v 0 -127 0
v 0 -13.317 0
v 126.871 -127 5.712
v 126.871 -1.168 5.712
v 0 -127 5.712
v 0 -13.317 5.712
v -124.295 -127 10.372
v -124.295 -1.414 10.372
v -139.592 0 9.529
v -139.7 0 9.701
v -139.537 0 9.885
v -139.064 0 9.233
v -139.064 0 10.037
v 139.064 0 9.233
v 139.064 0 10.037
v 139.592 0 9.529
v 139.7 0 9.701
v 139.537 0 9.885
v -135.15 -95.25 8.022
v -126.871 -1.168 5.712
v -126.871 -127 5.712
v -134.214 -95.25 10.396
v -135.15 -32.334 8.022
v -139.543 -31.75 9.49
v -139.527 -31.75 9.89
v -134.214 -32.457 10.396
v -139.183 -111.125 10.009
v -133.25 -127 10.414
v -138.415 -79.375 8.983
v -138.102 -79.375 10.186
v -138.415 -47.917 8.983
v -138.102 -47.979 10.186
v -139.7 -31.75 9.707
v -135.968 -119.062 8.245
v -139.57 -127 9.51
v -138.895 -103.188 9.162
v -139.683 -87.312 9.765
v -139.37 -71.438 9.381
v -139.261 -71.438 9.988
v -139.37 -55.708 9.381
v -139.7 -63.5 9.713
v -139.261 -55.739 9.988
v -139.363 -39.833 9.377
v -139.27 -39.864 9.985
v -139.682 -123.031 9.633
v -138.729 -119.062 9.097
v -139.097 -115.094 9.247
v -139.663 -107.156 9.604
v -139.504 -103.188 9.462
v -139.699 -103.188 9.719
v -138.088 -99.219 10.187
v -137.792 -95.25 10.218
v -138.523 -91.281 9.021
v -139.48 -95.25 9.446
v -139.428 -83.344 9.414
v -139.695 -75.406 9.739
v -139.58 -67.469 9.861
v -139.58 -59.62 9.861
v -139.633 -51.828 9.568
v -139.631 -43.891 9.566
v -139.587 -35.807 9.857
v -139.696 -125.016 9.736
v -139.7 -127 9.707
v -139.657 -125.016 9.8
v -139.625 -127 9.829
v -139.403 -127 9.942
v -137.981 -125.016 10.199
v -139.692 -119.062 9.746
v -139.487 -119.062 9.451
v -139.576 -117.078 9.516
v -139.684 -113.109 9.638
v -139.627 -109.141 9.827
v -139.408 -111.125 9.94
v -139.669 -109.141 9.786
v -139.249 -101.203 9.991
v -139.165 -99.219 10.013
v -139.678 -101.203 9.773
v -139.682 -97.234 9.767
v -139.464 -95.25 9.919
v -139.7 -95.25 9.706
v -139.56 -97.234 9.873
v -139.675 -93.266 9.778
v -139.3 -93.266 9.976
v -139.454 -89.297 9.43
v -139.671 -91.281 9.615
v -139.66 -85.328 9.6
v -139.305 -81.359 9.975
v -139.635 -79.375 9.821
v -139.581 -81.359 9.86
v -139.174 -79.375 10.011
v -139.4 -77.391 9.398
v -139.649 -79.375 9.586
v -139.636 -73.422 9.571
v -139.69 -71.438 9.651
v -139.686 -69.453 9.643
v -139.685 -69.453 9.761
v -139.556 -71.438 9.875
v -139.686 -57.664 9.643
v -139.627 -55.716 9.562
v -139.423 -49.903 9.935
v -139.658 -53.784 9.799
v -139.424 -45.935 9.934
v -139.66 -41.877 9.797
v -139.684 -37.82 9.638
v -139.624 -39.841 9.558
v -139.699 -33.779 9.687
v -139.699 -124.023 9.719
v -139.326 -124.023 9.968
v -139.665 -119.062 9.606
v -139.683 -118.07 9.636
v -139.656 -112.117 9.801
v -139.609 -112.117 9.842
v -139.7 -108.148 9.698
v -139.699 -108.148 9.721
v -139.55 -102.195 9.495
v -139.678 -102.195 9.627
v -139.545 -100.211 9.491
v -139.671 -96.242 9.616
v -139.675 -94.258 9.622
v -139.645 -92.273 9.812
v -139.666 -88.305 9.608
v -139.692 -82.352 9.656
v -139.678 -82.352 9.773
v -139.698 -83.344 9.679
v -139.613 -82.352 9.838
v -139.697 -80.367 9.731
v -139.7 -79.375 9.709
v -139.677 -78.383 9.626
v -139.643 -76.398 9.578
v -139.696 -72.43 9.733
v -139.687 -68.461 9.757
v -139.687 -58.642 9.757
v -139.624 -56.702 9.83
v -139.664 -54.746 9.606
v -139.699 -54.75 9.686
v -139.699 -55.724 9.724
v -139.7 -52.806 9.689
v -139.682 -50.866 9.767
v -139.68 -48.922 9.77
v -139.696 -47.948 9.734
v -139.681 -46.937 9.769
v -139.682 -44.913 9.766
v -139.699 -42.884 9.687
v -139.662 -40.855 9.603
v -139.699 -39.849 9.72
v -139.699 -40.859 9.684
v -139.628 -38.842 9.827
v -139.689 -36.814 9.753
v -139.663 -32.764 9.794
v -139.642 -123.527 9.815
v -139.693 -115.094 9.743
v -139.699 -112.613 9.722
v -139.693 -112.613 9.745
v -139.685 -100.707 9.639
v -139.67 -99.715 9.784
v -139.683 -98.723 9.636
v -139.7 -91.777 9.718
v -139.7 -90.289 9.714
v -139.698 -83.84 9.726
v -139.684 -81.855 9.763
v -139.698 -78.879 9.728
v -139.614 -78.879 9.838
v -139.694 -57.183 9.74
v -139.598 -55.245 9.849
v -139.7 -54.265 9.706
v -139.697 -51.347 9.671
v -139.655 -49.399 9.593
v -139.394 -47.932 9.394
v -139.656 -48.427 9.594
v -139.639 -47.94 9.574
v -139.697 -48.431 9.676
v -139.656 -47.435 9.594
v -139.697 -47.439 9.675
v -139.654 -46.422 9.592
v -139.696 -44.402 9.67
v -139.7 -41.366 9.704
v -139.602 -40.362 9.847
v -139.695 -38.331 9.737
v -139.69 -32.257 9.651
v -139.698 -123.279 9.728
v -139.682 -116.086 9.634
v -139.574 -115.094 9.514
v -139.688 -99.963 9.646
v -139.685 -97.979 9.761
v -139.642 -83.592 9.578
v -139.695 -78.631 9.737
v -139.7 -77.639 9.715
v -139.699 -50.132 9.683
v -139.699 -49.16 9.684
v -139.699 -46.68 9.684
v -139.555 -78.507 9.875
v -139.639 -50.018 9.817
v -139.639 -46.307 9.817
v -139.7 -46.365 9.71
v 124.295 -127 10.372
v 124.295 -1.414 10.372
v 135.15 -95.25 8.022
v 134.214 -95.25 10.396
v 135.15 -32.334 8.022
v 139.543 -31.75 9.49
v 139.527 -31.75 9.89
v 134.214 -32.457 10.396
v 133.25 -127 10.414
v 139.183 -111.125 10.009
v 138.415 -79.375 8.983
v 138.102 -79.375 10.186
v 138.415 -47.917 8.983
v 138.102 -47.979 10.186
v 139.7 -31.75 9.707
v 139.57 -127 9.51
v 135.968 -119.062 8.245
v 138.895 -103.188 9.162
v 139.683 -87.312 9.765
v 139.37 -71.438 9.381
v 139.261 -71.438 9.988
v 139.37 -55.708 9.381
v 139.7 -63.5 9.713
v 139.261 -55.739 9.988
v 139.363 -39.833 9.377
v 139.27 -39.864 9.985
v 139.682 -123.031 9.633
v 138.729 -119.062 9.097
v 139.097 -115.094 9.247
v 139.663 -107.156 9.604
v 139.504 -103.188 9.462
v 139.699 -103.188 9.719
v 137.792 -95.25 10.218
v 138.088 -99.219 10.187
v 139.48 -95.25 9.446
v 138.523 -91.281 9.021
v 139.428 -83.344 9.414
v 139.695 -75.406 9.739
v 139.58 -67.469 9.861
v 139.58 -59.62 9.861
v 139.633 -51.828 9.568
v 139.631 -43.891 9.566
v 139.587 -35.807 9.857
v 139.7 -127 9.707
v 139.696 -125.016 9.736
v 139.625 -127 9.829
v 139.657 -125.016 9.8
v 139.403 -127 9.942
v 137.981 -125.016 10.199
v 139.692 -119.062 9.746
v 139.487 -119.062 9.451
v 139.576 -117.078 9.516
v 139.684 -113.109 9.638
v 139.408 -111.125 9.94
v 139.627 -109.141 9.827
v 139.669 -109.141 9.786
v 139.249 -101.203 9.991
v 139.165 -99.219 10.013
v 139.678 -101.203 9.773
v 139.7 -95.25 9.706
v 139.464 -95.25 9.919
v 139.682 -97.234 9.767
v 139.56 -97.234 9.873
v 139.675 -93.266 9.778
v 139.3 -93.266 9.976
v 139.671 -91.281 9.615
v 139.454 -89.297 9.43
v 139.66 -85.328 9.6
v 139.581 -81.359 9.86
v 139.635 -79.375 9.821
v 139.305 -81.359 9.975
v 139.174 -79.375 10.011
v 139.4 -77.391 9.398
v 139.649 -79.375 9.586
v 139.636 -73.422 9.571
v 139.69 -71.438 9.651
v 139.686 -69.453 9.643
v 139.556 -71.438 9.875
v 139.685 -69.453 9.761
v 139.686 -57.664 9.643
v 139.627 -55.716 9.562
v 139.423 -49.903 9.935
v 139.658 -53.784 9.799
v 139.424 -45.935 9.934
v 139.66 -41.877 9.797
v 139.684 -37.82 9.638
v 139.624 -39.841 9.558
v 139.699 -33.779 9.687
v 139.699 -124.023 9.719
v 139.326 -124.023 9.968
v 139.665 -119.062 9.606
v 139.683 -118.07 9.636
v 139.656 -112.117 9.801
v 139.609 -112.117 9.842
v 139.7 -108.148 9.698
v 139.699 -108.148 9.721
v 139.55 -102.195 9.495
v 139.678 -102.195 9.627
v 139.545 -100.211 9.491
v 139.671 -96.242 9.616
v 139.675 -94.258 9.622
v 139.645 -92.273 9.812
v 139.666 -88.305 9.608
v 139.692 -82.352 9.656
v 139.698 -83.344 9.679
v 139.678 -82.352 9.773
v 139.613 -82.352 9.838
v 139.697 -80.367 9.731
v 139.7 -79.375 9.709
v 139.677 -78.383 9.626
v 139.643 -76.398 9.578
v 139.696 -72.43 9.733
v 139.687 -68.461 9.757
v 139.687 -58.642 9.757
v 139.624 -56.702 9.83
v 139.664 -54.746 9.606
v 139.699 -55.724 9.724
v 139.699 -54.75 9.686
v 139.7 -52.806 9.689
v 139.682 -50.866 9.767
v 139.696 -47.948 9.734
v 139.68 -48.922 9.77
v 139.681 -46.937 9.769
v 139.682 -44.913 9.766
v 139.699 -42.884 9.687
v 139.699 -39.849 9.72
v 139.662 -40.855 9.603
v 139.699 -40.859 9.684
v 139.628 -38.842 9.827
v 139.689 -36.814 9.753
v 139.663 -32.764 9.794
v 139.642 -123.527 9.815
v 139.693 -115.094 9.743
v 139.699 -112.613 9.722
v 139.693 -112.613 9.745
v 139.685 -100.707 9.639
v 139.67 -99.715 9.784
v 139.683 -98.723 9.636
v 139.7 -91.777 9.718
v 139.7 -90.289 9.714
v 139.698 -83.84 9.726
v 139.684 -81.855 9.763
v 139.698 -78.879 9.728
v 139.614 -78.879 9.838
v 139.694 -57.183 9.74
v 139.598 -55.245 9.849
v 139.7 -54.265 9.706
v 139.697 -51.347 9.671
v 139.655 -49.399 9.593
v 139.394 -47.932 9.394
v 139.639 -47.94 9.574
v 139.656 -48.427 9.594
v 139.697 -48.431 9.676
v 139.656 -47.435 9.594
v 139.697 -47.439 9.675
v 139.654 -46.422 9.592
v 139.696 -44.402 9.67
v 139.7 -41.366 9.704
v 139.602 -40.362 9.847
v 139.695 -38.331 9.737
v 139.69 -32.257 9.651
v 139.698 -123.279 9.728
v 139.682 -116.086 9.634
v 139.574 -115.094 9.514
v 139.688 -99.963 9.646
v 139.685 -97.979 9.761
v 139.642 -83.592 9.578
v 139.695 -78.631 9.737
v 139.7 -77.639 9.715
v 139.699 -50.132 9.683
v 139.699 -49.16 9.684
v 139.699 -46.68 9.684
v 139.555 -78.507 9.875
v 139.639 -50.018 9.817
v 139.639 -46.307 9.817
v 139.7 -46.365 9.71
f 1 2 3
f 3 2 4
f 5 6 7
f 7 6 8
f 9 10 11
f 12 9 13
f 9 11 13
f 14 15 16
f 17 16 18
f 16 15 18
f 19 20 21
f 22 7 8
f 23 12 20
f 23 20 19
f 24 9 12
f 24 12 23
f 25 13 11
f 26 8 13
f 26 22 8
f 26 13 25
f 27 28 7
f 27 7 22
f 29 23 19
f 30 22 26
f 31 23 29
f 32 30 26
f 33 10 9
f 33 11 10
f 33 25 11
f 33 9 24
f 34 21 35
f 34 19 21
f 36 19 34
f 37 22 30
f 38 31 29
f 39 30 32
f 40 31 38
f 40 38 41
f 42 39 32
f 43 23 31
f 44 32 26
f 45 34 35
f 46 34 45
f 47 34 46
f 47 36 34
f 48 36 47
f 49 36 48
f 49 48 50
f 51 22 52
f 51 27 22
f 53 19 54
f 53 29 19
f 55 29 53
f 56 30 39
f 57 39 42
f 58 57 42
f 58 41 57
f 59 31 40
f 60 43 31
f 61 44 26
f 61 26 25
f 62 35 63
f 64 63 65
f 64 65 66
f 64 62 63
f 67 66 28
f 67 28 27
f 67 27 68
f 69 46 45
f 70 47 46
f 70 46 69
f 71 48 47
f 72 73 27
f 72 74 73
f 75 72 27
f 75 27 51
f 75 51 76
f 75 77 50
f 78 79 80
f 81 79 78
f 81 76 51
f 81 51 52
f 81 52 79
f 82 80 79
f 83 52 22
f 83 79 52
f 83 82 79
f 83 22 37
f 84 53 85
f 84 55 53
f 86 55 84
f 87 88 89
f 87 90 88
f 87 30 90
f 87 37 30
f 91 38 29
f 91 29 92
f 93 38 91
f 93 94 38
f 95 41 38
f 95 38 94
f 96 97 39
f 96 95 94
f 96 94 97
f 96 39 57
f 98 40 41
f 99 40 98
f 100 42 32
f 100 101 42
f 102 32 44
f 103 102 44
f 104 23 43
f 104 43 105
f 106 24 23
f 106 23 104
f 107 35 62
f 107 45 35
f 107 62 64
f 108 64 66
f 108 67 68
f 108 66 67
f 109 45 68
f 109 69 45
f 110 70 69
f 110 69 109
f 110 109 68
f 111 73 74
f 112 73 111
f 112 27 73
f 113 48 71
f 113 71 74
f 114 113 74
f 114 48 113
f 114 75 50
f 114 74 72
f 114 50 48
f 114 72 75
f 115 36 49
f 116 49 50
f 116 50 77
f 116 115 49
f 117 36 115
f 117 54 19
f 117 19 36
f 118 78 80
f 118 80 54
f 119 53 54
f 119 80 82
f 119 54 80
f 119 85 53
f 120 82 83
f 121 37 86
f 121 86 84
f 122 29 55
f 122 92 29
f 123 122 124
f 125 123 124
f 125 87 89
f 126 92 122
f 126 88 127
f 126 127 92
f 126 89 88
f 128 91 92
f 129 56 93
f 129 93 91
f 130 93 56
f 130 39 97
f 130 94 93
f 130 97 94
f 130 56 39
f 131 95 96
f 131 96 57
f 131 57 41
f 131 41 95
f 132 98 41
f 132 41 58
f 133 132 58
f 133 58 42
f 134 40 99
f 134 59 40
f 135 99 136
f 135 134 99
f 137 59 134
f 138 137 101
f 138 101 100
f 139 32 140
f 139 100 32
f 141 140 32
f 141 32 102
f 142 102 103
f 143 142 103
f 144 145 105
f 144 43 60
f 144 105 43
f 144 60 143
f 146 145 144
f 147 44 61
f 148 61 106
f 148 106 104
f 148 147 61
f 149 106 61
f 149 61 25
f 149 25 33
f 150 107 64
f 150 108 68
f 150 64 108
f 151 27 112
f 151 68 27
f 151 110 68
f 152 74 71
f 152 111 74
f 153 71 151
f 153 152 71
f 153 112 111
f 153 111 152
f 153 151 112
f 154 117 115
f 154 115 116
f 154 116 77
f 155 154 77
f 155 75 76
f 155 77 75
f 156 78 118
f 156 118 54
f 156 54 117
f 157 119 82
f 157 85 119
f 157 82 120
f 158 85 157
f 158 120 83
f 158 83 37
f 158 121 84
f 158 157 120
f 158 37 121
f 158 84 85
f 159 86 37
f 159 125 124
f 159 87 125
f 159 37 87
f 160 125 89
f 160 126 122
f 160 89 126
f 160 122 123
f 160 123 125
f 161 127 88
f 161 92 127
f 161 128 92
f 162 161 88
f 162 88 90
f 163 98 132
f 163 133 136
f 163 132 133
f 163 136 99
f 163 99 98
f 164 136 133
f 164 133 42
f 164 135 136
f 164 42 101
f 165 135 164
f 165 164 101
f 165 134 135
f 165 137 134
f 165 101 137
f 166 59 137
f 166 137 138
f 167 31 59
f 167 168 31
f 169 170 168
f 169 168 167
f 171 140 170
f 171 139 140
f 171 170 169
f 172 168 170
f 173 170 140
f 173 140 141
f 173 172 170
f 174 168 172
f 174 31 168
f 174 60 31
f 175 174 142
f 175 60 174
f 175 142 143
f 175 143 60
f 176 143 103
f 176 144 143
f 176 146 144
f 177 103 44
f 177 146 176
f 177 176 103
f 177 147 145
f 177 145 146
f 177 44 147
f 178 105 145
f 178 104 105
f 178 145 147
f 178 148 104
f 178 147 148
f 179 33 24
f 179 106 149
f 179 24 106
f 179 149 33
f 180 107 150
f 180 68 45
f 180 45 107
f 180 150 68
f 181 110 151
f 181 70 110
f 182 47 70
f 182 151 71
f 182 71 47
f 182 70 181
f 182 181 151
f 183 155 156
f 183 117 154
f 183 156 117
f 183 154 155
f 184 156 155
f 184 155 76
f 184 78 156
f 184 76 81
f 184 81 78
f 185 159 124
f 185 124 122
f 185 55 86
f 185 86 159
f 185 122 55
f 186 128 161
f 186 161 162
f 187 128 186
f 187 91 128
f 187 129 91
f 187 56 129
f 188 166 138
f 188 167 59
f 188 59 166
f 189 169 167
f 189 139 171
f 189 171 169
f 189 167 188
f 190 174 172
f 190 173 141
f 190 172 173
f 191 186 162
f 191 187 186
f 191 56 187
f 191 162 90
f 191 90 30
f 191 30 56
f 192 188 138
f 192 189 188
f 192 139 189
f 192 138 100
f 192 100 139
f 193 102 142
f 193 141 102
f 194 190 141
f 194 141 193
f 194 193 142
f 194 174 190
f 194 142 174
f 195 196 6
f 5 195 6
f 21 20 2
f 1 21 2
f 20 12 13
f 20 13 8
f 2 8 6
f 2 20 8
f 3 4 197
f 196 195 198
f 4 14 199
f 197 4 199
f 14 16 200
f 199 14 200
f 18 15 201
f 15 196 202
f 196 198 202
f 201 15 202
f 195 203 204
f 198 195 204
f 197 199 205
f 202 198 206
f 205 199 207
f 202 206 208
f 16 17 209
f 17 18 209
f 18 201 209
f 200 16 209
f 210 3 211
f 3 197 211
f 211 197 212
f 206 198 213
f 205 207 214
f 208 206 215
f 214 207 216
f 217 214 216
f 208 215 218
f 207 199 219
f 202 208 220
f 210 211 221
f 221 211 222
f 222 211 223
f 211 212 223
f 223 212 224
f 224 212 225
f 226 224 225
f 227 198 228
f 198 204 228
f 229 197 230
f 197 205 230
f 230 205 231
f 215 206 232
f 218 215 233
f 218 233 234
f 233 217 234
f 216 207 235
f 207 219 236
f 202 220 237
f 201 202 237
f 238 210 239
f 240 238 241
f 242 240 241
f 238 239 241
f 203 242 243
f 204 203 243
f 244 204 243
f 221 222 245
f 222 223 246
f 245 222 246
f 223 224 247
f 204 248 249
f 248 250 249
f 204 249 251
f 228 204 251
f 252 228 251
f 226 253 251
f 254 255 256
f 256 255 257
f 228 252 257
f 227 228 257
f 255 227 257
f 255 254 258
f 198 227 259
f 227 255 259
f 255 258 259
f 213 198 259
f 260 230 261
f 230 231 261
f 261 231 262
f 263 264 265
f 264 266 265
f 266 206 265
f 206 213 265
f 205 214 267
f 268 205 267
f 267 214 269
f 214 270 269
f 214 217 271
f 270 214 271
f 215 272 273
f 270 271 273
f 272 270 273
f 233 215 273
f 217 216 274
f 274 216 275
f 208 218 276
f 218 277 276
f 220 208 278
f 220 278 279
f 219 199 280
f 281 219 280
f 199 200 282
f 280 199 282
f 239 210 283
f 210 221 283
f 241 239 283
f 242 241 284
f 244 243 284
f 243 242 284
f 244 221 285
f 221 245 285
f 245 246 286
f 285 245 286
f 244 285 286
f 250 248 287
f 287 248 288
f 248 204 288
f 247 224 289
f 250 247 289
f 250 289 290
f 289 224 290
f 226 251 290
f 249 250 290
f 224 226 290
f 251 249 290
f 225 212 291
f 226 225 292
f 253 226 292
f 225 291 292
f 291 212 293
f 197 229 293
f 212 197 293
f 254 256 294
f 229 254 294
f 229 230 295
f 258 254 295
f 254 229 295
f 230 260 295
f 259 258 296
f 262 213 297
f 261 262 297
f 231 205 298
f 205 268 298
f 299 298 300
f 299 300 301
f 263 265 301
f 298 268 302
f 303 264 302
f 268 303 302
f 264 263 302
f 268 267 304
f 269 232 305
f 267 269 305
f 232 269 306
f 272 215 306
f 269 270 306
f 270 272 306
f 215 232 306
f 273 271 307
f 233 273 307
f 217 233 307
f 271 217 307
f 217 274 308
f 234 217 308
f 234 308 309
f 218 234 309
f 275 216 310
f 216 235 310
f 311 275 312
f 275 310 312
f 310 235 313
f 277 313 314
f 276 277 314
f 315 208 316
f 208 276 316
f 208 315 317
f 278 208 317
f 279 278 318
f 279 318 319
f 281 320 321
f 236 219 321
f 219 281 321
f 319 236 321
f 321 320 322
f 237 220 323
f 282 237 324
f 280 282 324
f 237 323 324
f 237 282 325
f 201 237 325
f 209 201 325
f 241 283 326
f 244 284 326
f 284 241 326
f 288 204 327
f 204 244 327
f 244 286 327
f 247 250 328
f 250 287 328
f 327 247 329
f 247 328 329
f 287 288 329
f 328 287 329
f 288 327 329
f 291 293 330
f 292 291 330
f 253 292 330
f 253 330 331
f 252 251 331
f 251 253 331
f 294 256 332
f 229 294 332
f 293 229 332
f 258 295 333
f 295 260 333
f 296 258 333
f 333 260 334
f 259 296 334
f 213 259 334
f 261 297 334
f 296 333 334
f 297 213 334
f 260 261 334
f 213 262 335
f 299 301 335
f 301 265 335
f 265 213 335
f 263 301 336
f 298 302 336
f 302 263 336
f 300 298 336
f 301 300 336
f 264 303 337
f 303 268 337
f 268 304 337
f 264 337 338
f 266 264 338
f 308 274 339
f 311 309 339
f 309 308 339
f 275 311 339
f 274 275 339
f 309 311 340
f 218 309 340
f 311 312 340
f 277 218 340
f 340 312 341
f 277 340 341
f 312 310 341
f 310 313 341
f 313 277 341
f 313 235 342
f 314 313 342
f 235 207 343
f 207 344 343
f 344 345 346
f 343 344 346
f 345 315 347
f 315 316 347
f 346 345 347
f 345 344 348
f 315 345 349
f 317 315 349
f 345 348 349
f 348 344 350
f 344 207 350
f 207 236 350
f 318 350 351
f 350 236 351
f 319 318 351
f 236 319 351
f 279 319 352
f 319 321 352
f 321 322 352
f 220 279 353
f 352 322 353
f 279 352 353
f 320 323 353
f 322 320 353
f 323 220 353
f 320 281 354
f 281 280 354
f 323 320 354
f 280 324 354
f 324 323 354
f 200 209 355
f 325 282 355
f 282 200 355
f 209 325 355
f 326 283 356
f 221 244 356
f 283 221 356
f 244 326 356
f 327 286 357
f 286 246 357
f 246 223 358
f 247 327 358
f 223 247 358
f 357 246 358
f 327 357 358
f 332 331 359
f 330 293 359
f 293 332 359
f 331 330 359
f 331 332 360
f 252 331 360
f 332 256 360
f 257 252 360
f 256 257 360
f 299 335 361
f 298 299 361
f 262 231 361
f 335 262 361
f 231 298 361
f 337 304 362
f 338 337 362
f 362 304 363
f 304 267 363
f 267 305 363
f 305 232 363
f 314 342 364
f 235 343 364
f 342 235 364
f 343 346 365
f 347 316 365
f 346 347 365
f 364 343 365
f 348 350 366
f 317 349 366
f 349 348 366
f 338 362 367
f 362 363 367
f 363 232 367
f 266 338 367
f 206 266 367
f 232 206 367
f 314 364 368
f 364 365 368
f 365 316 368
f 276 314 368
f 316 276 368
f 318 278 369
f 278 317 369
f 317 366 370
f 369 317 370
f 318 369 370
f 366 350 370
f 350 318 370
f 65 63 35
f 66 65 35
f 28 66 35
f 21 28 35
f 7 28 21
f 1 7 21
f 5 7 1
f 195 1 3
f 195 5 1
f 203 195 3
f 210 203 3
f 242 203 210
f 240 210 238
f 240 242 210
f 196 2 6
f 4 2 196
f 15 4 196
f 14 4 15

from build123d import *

# Parameters (mm, degrees)
F1_DEPTH = 127
F3_DEPTH = 203.2


with BuildPart() as f1:
    # F0 (on Front) → F1 (new body)
    with BuildSketch(Plane.XZ):
        with BuildLine():
            Line((-126.8714908583, 5.71181297), (0, 0))
            Line((0, 0), (126.8714908583, 5.71181297))
            add(Edge.make_bspline(
                [(126.8714908583, 5.71181297), (131.7700180401, 7.3261107818), (148.343354527, 10.6383260951), (130.2819001647, 10.4699817676), (124.2953687906, 10.3716664016)],
                knots=[0, 0, 0, 0, 0.4828204634, 1, 1, 1, 1], degree=3))
            Line((124.2953687906, 10.3716664016), (0, 5.71181297))
            Line((0, 5.71181297), (-124.2953687906, 10.3716664016))
            add(Edge.make_bspline(
                [(-126.8714908583, 5.71181297), (-131.7700180401, 7.3261107818), (-148.343354527, 10.6383260951), (-130.2819001647, 10.4699817676), (-124.2953687906, 10.3716664016)],
                knots=[0, 0, 0, 0, 0.4828204634, 1, 1, 1, 1], degree=3))
        make_face()
    extrude(amount=F1_DEPTH)

    # F2 (on Top) → F3 (cut)
    with BuildSketch(Plane.XY):
        Polygon((139.0637980759, 0), (-139.0637980759, 0), (0, -13.3172844347), align=None)
    extrude(amount=F3_DEPTH, mode=Mode.SUBTRACT)


solid = f1.part
